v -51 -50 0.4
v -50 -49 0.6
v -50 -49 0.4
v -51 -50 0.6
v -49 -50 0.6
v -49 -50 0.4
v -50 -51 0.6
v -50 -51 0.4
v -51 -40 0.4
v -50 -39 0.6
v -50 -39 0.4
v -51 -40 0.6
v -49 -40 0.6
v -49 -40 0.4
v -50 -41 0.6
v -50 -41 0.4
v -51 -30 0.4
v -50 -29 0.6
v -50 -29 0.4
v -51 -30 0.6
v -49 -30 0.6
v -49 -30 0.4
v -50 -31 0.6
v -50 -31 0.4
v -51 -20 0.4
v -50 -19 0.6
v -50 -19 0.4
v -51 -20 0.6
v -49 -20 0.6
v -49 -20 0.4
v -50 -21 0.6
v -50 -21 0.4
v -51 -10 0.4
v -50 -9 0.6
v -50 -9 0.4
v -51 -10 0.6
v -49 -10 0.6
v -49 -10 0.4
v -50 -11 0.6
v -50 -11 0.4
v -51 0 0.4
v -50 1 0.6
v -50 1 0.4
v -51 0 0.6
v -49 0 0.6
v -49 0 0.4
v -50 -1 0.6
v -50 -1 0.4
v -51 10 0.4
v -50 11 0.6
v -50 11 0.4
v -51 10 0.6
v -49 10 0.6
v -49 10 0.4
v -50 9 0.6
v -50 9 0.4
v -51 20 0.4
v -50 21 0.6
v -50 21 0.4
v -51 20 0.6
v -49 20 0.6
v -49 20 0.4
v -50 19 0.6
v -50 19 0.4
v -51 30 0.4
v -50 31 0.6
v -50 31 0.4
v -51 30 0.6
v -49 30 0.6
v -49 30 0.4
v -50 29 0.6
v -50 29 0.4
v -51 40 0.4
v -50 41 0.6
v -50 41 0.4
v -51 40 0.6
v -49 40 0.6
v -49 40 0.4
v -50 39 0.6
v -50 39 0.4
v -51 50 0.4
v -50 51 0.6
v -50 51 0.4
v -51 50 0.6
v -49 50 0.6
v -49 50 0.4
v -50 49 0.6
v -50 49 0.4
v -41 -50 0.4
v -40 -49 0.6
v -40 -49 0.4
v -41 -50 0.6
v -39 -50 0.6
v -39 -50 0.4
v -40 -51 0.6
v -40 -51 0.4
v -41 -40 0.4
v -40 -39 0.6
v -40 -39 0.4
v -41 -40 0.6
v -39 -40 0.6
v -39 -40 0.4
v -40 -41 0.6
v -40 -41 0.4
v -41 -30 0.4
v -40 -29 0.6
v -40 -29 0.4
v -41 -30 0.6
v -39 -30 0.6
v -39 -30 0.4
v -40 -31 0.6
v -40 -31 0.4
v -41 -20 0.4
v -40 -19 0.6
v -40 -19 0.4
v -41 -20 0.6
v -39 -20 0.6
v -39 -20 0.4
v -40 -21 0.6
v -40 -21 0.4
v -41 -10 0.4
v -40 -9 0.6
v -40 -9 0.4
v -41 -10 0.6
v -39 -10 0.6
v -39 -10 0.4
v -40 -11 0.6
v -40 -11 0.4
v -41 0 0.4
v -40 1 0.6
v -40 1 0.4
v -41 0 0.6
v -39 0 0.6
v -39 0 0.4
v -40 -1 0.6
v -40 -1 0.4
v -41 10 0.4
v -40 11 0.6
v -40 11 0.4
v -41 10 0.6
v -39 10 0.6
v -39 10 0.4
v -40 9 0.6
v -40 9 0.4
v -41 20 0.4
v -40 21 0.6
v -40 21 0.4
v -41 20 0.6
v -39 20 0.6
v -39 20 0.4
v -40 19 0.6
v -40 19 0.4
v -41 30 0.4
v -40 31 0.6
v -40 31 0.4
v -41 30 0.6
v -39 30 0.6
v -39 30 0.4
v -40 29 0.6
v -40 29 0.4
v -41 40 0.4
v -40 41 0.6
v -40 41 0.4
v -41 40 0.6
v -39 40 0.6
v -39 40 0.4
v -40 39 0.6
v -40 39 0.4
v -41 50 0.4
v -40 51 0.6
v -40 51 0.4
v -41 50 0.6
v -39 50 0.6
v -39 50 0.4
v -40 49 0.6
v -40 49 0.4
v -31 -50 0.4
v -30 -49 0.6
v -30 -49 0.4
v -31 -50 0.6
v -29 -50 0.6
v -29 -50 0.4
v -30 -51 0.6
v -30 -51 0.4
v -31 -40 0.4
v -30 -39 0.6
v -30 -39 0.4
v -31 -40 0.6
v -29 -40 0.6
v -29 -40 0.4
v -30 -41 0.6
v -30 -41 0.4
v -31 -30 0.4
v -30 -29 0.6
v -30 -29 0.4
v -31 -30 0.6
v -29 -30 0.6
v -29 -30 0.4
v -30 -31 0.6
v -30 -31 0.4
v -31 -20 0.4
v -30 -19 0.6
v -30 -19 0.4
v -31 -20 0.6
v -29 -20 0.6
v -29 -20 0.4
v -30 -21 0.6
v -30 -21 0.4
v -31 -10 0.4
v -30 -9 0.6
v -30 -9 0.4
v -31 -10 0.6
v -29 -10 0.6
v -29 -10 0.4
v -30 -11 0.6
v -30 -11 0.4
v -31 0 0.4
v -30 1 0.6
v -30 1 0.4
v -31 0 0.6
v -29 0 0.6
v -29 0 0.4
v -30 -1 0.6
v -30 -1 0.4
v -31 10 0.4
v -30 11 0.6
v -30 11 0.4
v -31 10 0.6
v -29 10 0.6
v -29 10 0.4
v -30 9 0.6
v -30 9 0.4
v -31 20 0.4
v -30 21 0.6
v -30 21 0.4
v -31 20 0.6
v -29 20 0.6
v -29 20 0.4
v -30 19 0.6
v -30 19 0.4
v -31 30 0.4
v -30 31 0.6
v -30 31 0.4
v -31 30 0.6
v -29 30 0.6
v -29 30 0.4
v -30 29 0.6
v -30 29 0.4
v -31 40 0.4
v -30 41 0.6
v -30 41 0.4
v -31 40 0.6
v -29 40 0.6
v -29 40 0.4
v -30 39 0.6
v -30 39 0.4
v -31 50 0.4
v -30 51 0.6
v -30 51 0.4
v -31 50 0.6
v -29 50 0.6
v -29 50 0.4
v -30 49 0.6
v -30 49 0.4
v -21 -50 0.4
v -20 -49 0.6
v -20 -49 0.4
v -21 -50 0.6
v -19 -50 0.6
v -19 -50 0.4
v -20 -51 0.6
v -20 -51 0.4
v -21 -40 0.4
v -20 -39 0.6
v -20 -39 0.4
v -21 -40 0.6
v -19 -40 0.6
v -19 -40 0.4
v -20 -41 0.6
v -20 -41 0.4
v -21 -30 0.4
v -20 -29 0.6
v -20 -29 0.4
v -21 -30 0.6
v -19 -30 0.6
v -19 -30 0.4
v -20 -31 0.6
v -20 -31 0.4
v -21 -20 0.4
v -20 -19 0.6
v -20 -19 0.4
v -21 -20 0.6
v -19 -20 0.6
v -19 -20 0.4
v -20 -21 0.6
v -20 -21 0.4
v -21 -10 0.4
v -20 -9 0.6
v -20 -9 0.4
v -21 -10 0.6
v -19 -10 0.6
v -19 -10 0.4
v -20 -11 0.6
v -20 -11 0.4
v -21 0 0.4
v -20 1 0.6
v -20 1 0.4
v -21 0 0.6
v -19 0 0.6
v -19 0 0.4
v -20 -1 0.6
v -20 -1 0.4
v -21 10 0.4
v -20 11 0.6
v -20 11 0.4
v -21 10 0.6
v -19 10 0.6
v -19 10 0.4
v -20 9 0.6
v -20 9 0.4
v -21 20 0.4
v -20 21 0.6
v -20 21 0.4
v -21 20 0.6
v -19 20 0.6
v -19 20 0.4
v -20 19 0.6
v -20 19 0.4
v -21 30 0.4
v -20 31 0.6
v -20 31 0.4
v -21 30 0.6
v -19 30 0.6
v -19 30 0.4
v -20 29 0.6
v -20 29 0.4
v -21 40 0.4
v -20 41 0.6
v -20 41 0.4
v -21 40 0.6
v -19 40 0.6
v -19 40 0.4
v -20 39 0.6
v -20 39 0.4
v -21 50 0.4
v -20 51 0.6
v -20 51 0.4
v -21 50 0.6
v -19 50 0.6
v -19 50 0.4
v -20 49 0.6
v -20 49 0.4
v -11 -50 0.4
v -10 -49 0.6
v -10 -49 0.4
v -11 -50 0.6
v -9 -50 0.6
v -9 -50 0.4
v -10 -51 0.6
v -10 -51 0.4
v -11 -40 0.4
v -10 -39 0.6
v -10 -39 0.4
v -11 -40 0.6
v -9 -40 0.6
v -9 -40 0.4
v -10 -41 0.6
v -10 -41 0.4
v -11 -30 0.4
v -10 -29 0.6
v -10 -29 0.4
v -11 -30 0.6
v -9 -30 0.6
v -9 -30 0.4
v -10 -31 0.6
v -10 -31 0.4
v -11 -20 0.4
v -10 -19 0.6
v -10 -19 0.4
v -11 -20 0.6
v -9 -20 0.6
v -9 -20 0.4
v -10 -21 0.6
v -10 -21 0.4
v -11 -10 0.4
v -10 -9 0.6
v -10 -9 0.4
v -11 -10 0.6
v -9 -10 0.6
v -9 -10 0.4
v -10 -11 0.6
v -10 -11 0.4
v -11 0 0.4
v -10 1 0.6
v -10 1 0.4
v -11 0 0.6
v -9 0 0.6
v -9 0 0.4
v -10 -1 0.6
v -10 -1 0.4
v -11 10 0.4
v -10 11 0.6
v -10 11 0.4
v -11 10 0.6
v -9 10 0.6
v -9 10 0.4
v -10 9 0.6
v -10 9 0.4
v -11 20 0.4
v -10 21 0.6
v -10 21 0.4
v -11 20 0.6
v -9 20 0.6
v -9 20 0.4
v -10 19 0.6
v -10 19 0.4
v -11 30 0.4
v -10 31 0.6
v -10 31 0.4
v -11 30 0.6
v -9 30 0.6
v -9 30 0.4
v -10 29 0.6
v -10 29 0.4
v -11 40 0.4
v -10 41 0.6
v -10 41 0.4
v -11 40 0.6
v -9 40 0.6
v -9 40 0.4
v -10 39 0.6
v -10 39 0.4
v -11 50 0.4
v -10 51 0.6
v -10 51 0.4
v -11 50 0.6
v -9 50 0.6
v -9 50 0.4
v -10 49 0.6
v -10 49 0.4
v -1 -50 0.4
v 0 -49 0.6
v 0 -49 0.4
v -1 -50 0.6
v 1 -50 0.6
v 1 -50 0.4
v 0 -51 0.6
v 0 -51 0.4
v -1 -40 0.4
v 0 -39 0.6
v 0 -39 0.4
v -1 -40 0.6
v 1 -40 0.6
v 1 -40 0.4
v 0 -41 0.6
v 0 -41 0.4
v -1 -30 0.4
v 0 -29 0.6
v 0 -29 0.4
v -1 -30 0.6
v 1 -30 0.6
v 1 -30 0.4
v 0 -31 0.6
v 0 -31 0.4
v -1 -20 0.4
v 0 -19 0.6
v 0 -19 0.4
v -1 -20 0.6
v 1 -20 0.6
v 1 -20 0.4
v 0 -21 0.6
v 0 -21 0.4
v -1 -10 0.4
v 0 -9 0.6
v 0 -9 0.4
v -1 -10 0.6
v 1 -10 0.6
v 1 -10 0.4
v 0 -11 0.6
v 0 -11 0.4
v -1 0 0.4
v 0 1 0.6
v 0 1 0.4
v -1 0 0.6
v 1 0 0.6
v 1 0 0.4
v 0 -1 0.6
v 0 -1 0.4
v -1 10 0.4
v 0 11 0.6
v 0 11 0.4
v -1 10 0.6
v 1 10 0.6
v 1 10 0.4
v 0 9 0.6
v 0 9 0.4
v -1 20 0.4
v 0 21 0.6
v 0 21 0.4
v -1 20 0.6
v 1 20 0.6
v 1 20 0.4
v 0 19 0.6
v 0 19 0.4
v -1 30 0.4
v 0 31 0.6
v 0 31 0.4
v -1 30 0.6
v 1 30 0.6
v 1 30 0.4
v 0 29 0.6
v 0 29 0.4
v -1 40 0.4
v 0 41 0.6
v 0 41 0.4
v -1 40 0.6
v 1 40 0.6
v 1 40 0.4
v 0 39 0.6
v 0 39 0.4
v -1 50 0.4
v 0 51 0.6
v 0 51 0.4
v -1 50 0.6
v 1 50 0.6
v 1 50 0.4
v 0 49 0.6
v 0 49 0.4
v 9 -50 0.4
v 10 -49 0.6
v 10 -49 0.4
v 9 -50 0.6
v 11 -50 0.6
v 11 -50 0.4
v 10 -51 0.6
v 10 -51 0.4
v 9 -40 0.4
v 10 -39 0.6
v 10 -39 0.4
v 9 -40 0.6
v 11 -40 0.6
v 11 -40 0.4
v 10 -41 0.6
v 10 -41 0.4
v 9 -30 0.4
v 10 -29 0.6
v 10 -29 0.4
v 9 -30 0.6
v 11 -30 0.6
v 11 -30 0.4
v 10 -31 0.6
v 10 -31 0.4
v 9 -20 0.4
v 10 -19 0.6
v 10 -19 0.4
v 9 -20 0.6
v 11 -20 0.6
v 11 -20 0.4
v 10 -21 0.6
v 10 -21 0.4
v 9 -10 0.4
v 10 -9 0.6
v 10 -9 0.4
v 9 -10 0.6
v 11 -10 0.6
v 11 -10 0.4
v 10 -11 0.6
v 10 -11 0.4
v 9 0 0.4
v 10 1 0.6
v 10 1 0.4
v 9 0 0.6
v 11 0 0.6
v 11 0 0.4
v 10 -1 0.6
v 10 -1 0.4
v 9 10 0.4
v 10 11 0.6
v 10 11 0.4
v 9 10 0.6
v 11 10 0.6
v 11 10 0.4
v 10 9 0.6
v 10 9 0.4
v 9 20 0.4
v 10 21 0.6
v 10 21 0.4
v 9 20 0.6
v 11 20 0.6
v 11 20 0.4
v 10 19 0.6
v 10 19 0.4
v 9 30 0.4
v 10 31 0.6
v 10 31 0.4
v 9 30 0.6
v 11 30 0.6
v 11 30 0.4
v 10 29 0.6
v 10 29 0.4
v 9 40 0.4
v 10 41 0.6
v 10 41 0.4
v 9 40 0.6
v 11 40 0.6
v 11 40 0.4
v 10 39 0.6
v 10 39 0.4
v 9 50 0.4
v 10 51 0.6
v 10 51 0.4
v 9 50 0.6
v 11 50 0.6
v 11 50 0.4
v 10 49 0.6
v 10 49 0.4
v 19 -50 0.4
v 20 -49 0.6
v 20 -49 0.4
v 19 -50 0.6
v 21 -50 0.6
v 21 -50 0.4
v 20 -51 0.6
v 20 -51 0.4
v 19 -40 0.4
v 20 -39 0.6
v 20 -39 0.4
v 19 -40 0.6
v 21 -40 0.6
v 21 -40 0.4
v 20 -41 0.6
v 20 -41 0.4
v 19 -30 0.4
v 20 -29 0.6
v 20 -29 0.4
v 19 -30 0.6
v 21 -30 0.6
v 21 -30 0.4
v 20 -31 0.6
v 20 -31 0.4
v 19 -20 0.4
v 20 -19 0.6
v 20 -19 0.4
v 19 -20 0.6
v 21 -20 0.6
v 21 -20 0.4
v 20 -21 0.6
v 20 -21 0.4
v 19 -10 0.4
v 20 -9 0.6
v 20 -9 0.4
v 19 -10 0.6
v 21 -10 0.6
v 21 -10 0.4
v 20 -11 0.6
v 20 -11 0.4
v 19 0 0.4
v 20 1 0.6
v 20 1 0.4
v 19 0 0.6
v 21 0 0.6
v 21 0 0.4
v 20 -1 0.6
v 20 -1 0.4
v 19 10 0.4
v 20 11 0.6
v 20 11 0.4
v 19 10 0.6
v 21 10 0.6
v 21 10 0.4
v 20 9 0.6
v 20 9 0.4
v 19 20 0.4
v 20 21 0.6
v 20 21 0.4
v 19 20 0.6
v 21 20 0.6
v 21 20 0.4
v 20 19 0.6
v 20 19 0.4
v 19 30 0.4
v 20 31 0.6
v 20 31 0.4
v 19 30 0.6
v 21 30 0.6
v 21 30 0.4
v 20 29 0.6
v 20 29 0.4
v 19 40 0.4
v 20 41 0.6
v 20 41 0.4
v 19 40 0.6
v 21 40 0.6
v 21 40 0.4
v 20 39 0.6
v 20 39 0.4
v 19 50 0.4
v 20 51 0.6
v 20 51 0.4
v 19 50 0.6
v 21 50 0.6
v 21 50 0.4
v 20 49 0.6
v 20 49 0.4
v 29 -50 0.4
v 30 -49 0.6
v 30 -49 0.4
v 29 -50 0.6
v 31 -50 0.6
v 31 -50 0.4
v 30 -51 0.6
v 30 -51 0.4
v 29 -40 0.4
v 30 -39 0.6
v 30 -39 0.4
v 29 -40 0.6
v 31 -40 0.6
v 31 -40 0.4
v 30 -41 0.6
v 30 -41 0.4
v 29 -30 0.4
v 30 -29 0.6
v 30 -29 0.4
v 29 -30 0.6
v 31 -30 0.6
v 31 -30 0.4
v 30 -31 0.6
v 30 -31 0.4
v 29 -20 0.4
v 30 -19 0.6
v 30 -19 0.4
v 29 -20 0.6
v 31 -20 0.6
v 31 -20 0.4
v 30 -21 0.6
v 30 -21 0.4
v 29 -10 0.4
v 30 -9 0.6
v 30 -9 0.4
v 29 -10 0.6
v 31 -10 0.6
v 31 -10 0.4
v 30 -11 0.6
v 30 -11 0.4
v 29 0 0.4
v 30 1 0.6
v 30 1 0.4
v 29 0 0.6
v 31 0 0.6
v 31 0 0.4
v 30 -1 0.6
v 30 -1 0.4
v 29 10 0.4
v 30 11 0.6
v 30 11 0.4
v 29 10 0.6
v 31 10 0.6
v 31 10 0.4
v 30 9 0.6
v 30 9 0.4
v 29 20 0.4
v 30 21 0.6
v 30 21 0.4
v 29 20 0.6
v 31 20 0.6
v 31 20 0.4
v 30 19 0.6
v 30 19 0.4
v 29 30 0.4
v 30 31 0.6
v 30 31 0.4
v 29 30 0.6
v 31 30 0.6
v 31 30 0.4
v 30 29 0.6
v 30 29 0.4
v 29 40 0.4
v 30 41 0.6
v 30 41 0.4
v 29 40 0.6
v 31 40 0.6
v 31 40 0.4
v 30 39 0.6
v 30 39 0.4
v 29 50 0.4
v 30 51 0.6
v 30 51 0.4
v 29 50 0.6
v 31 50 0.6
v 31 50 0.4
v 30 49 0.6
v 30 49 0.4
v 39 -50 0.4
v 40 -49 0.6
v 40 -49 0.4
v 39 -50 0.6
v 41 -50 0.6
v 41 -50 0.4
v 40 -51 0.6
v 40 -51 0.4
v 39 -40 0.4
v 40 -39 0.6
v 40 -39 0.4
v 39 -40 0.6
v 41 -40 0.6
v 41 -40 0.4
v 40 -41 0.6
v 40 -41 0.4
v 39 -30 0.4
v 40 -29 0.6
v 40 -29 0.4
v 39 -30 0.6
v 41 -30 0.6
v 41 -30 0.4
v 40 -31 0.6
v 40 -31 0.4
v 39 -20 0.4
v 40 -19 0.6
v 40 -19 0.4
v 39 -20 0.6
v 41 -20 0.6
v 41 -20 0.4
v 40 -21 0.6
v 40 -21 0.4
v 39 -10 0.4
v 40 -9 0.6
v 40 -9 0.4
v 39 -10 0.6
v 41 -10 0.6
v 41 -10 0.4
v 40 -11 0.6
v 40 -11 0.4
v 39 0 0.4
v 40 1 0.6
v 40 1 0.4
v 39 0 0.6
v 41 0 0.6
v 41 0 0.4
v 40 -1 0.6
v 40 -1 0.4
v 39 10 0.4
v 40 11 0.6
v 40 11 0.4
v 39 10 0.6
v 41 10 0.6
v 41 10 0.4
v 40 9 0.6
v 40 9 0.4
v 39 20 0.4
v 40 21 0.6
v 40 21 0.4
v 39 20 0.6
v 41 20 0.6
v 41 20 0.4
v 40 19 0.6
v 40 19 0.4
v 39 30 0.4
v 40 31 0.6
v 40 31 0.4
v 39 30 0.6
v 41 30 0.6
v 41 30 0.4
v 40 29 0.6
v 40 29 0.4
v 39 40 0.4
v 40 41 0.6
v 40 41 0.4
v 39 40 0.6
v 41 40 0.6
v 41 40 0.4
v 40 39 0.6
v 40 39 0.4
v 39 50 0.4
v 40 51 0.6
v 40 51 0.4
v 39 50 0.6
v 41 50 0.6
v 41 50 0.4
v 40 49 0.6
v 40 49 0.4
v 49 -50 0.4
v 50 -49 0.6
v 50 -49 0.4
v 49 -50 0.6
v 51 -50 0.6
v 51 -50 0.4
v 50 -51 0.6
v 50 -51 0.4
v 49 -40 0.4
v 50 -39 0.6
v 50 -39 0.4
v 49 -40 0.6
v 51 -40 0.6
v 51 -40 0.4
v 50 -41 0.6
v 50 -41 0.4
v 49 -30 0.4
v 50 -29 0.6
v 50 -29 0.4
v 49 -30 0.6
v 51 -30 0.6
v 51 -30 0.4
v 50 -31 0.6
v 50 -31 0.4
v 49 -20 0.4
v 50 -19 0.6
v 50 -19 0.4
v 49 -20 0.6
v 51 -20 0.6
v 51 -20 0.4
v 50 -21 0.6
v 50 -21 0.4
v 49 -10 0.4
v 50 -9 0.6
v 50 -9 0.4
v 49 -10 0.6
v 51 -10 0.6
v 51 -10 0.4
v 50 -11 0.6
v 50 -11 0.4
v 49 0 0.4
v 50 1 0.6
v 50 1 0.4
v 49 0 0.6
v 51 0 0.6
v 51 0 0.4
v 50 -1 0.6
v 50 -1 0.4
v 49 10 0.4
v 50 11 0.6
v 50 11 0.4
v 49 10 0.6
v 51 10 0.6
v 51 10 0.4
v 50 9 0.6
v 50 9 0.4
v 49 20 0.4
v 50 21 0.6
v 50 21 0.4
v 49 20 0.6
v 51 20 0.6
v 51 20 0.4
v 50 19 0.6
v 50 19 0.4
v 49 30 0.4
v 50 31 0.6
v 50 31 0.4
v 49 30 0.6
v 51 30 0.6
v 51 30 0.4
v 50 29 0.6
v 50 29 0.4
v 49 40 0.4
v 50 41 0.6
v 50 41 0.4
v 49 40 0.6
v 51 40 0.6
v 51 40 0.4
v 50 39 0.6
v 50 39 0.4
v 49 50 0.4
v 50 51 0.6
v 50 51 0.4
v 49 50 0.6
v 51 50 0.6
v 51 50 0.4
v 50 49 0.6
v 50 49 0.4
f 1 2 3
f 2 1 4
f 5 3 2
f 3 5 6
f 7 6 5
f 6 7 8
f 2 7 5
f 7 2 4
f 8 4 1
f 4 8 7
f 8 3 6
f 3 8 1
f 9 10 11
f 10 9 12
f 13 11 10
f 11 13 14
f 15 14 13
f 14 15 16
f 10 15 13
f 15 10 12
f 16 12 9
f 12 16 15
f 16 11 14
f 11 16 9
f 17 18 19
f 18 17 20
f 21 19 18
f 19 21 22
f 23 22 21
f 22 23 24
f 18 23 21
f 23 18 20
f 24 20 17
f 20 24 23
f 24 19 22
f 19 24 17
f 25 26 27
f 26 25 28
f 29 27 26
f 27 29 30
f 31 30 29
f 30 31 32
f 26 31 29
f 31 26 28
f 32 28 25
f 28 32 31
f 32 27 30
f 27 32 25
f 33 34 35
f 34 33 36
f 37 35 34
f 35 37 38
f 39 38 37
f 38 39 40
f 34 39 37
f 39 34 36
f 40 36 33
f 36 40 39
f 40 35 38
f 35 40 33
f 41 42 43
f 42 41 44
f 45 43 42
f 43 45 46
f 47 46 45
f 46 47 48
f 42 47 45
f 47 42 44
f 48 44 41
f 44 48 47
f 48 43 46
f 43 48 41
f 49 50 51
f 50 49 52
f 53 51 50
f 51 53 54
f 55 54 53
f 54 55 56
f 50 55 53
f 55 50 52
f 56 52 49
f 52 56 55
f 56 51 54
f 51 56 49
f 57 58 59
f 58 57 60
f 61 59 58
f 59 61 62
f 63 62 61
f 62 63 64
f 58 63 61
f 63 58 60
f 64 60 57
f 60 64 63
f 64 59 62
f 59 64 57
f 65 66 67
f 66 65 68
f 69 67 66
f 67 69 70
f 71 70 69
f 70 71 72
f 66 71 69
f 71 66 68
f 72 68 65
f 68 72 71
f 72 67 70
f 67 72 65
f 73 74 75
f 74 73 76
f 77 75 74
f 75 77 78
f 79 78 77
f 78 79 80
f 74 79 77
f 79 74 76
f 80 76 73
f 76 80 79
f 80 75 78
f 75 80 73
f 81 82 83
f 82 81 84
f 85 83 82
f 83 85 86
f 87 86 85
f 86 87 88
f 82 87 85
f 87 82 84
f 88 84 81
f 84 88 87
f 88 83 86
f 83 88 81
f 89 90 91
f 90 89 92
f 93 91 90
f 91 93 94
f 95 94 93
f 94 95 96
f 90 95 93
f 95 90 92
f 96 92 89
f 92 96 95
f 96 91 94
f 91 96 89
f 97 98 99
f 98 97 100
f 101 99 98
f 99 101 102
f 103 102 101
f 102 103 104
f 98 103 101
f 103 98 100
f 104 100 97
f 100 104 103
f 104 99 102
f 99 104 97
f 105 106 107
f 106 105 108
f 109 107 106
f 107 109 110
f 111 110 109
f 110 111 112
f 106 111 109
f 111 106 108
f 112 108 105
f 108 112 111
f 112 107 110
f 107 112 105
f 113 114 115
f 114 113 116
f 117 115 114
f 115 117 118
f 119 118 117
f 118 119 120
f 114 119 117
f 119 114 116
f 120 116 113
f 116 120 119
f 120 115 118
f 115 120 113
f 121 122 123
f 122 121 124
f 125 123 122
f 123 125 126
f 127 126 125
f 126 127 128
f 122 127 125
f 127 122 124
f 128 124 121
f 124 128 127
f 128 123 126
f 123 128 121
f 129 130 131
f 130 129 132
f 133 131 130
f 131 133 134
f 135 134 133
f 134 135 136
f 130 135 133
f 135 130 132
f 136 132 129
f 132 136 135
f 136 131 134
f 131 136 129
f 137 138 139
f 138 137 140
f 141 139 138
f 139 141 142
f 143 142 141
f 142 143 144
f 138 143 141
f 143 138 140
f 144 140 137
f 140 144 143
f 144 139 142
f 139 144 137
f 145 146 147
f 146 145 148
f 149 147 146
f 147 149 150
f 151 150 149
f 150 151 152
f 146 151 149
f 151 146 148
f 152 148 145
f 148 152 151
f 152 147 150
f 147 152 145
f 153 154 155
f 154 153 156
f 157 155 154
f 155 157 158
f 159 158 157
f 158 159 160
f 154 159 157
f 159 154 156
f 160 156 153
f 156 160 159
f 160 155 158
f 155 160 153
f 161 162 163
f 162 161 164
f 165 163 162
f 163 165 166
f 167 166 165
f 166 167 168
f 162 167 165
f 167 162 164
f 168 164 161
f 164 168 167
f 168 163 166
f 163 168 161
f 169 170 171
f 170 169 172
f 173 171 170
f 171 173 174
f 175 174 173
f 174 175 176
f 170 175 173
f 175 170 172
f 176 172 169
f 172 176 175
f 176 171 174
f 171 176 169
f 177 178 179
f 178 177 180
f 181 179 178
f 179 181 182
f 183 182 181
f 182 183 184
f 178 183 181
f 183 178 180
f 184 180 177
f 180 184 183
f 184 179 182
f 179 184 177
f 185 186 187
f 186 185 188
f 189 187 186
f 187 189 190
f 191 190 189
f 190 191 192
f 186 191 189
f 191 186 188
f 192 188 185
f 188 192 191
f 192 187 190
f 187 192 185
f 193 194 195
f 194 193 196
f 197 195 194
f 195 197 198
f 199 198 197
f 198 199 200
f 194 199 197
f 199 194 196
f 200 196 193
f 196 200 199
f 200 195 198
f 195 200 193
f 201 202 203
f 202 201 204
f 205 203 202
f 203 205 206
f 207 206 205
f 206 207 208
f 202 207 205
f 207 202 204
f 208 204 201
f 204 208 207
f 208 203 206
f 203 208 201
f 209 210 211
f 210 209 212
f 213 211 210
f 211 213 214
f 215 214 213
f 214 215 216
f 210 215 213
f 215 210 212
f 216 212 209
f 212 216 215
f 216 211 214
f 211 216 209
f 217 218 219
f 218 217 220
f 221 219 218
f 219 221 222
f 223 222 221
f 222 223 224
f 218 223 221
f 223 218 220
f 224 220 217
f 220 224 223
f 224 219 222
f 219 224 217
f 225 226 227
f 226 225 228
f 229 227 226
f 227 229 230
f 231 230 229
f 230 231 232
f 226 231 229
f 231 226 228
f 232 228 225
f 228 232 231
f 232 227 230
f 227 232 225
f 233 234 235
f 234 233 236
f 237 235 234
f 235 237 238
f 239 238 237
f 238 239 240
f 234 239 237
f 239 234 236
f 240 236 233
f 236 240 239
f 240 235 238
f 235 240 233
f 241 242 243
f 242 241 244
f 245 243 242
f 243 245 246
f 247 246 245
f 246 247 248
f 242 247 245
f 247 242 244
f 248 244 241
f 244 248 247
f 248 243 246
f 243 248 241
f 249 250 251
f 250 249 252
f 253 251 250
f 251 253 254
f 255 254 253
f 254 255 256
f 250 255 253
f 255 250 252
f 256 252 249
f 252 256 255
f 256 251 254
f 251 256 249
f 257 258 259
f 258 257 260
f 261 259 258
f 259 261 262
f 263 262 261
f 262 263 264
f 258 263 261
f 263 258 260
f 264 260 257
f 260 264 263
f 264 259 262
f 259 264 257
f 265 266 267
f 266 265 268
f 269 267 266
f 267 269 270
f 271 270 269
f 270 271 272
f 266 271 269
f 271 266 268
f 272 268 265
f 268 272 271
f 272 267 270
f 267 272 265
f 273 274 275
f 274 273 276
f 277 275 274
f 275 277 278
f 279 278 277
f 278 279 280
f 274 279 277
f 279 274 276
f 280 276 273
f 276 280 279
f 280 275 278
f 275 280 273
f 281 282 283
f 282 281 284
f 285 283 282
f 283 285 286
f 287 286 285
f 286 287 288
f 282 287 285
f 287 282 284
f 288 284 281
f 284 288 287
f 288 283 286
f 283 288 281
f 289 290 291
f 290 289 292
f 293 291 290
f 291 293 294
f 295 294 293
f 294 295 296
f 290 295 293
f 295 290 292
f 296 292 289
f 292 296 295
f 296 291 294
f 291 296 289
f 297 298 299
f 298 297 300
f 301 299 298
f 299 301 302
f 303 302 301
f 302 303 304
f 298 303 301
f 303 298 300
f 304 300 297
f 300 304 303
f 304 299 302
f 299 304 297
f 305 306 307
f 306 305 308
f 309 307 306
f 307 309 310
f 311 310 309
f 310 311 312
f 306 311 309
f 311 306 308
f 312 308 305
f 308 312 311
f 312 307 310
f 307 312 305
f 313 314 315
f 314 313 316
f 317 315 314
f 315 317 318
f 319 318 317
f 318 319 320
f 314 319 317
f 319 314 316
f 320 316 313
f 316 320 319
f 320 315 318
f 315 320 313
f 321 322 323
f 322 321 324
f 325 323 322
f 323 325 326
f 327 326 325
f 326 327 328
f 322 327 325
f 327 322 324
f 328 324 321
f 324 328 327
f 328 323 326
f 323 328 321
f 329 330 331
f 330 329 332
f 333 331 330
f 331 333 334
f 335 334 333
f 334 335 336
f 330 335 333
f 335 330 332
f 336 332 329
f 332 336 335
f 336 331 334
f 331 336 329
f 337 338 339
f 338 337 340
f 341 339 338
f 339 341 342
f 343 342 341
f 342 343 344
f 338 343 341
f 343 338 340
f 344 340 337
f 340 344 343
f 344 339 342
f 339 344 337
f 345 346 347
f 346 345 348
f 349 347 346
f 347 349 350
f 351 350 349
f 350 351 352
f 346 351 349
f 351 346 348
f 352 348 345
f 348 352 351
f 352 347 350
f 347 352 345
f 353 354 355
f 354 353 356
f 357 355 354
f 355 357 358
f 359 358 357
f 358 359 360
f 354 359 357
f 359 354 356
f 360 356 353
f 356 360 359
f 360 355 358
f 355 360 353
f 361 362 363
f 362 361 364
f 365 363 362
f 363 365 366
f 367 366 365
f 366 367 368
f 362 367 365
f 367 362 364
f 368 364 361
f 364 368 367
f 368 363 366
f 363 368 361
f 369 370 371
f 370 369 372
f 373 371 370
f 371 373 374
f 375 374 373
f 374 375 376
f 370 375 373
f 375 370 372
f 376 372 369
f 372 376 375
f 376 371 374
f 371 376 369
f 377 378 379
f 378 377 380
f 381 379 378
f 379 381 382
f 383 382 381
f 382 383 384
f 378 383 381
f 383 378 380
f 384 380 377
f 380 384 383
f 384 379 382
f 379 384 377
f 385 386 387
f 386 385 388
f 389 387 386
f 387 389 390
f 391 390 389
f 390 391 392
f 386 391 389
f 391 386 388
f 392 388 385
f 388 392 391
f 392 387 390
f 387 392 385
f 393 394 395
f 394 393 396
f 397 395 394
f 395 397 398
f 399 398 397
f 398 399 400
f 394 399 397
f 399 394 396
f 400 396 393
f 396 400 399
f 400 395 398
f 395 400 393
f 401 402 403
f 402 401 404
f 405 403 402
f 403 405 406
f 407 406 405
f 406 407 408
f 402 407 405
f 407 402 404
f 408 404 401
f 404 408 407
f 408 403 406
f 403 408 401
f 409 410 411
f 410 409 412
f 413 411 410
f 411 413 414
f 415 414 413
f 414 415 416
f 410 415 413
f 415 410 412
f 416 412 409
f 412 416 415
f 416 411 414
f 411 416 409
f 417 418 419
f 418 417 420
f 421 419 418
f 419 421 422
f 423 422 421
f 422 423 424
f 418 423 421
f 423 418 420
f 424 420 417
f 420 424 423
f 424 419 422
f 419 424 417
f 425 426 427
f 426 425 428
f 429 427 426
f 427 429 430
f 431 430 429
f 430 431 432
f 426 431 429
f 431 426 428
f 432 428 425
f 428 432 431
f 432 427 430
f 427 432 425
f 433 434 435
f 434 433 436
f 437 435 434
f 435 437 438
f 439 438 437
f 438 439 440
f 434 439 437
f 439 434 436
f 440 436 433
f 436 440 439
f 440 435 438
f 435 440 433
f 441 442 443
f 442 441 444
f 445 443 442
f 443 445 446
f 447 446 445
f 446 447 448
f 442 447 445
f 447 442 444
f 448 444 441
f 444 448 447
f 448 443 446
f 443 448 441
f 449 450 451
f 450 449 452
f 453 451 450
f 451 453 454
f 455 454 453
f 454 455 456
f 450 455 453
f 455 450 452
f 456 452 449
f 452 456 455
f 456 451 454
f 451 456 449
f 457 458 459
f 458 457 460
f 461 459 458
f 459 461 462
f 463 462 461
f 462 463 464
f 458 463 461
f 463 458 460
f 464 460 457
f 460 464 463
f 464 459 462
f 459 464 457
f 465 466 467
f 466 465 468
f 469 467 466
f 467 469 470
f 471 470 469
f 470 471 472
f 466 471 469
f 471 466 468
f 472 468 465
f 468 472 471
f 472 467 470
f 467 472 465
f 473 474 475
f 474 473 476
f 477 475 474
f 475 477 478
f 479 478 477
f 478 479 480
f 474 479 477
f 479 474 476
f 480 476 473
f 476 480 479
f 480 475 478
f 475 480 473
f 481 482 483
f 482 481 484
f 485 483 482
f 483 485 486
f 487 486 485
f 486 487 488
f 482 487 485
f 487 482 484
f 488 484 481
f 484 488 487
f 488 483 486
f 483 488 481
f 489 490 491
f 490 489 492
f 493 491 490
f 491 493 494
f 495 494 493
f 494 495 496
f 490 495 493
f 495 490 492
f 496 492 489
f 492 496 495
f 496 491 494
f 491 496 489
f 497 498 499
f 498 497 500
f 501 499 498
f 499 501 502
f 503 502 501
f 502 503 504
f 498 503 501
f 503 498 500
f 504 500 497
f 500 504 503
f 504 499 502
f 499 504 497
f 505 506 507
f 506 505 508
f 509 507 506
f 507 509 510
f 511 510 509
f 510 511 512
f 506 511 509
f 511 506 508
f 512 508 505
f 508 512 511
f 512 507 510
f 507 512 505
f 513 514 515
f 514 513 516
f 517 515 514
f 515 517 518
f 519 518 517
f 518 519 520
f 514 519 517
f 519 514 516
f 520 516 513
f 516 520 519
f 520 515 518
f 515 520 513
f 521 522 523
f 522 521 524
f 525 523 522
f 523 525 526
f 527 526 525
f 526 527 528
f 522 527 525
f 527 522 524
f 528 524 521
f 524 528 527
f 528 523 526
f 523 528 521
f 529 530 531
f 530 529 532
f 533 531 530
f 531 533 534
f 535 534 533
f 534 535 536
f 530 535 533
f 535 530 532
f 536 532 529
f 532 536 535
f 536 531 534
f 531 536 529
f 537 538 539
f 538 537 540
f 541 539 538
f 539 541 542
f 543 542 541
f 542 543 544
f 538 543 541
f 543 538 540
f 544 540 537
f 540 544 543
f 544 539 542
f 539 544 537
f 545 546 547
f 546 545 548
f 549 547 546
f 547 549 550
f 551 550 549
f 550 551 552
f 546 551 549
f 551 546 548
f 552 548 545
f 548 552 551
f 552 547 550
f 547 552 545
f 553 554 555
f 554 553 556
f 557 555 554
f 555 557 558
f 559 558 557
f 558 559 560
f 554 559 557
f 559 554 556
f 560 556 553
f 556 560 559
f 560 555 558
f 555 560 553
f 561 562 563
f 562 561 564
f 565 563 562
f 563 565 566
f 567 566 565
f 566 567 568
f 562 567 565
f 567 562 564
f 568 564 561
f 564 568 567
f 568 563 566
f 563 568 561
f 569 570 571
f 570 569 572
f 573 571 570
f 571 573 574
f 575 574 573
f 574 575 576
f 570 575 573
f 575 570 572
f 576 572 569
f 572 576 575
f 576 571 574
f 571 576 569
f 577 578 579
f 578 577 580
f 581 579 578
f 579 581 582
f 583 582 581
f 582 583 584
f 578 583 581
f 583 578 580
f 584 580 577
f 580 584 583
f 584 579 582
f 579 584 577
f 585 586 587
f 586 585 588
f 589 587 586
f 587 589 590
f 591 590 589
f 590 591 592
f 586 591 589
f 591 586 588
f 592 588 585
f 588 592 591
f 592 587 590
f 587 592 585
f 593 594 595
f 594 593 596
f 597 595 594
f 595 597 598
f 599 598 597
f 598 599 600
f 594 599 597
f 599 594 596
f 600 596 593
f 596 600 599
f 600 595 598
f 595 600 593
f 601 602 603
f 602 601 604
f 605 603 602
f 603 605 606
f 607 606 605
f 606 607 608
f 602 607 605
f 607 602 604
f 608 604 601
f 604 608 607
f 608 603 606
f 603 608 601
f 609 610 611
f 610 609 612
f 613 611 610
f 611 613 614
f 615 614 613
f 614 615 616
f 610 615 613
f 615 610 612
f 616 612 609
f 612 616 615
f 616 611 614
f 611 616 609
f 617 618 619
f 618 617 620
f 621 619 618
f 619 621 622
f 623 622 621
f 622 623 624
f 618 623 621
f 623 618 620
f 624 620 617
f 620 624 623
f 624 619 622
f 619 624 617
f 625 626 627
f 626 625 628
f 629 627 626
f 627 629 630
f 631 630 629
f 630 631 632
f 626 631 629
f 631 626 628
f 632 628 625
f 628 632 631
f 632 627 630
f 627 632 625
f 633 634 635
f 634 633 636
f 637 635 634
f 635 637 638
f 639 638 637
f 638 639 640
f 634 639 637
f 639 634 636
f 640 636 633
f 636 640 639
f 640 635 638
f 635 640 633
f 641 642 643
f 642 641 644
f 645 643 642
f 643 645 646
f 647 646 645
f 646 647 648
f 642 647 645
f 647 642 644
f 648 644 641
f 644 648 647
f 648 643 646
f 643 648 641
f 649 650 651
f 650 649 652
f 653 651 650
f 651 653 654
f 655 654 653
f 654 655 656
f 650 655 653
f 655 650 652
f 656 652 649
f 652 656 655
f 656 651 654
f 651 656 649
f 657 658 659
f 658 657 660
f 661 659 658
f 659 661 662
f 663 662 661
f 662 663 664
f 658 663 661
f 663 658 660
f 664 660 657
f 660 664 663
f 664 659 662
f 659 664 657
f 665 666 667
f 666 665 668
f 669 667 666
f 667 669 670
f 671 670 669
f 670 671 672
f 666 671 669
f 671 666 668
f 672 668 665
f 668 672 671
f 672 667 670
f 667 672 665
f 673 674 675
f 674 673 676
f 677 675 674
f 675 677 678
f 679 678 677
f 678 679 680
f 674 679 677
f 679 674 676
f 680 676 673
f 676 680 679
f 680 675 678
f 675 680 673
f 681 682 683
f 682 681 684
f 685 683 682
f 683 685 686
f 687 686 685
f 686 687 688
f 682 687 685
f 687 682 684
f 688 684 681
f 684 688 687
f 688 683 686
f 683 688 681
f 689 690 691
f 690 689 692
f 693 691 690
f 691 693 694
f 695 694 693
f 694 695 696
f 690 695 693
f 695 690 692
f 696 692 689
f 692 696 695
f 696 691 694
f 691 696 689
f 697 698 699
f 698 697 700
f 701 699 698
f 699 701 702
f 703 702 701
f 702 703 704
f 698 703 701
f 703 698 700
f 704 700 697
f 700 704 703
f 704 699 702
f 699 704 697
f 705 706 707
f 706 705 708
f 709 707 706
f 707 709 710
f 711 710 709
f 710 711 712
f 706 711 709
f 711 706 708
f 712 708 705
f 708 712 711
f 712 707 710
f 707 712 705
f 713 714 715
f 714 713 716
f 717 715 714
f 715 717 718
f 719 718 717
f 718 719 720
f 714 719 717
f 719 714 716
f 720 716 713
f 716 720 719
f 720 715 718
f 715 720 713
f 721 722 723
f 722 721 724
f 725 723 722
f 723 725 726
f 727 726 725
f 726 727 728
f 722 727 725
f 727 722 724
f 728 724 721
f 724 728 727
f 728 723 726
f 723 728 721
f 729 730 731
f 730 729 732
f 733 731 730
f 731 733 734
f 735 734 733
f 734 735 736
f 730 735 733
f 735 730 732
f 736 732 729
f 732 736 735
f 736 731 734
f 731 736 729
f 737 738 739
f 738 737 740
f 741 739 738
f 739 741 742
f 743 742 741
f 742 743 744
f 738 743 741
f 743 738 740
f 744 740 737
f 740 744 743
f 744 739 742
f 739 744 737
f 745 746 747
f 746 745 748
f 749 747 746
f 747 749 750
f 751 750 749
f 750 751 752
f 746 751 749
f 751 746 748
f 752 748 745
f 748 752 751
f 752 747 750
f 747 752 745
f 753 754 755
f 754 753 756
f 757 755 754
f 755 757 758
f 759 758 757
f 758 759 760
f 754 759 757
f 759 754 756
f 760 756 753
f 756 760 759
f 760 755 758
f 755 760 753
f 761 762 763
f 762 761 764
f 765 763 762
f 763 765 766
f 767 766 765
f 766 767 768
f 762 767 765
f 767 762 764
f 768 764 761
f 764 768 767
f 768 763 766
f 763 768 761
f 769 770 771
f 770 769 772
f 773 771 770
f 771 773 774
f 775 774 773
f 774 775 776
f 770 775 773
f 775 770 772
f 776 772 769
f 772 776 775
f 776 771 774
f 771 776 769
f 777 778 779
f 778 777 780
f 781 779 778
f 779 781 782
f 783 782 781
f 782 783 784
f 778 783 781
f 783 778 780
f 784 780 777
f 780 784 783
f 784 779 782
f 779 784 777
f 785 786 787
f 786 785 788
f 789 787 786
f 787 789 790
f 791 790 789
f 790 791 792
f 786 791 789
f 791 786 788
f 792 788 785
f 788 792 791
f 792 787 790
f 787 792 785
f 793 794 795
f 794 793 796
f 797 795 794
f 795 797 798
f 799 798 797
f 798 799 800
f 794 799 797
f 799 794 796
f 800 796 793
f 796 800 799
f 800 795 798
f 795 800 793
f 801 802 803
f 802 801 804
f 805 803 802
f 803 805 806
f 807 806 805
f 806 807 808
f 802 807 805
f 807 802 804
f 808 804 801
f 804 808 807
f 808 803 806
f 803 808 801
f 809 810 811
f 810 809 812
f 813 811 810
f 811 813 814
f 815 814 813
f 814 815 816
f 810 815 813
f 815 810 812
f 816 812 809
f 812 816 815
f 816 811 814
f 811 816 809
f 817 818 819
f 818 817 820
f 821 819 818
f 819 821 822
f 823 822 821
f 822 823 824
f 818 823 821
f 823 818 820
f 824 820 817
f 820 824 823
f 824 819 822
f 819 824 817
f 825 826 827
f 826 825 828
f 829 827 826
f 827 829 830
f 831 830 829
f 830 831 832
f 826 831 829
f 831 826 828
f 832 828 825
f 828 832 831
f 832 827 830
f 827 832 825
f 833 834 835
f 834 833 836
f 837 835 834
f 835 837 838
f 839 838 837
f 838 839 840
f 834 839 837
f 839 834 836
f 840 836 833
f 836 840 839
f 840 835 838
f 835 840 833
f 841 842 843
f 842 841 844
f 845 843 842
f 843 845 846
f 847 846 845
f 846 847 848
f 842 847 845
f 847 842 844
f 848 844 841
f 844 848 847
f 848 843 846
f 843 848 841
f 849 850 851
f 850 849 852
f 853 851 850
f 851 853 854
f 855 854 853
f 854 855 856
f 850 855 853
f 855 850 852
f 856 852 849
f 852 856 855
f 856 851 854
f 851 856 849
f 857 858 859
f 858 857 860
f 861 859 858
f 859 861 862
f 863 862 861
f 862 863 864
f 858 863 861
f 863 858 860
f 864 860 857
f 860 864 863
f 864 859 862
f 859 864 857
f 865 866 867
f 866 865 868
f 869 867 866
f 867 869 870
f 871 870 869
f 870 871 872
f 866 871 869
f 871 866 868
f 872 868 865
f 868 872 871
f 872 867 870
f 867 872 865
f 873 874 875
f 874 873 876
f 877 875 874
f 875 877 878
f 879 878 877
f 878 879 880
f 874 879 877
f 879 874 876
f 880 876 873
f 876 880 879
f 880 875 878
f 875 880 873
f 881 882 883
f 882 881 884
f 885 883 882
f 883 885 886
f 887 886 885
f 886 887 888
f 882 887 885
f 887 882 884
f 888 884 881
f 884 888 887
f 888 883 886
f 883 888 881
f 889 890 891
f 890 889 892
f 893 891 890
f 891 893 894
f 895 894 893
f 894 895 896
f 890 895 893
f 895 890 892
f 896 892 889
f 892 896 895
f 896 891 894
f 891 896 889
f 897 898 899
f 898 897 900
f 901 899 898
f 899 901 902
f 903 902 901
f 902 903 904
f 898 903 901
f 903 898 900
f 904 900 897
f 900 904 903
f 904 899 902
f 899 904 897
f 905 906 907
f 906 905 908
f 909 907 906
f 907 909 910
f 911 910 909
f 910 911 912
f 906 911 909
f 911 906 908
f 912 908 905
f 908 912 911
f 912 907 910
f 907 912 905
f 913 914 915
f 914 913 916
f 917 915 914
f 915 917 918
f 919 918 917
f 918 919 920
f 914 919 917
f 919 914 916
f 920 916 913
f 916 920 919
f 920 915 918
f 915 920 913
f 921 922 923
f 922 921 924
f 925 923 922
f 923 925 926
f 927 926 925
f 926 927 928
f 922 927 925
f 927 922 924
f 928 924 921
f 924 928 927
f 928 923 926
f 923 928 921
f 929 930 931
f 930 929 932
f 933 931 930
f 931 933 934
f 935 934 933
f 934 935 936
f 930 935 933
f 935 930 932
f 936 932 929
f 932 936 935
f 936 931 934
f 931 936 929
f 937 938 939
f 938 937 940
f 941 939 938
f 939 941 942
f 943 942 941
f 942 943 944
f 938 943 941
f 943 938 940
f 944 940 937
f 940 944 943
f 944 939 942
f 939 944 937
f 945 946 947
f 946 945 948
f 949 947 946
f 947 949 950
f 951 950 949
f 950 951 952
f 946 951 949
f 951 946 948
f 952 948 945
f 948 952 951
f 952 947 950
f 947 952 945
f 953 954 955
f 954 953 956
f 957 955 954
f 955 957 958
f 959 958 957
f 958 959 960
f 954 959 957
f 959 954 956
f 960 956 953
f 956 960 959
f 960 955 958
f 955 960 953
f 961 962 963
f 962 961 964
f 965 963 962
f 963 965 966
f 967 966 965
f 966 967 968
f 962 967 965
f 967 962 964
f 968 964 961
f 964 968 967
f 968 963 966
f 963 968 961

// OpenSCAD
//  This is a quick customizable way to make an array of columns of any size and any size columns


//Defines the area of the  array in mm
a=100;

//Defines the radius of the columns in mm
r=1;

//Defines the thickness of the columns in mm
t=0.2;

//Defines the spacing of the columns in mm
s=10; 



//Choose your desired shape from the drop down menu
$fn = 4;//[3:Triangle, 4:Square, 6:Hexagon, 100:Circle]

 



module array() {

  q = floor(a/2/s);
    for (x=[-q:q])
      for (y=[-q:q])
        translate([x*s,y*s,r/2])
          cylinder(h=t, r=r, ,center=true);
}


array();
